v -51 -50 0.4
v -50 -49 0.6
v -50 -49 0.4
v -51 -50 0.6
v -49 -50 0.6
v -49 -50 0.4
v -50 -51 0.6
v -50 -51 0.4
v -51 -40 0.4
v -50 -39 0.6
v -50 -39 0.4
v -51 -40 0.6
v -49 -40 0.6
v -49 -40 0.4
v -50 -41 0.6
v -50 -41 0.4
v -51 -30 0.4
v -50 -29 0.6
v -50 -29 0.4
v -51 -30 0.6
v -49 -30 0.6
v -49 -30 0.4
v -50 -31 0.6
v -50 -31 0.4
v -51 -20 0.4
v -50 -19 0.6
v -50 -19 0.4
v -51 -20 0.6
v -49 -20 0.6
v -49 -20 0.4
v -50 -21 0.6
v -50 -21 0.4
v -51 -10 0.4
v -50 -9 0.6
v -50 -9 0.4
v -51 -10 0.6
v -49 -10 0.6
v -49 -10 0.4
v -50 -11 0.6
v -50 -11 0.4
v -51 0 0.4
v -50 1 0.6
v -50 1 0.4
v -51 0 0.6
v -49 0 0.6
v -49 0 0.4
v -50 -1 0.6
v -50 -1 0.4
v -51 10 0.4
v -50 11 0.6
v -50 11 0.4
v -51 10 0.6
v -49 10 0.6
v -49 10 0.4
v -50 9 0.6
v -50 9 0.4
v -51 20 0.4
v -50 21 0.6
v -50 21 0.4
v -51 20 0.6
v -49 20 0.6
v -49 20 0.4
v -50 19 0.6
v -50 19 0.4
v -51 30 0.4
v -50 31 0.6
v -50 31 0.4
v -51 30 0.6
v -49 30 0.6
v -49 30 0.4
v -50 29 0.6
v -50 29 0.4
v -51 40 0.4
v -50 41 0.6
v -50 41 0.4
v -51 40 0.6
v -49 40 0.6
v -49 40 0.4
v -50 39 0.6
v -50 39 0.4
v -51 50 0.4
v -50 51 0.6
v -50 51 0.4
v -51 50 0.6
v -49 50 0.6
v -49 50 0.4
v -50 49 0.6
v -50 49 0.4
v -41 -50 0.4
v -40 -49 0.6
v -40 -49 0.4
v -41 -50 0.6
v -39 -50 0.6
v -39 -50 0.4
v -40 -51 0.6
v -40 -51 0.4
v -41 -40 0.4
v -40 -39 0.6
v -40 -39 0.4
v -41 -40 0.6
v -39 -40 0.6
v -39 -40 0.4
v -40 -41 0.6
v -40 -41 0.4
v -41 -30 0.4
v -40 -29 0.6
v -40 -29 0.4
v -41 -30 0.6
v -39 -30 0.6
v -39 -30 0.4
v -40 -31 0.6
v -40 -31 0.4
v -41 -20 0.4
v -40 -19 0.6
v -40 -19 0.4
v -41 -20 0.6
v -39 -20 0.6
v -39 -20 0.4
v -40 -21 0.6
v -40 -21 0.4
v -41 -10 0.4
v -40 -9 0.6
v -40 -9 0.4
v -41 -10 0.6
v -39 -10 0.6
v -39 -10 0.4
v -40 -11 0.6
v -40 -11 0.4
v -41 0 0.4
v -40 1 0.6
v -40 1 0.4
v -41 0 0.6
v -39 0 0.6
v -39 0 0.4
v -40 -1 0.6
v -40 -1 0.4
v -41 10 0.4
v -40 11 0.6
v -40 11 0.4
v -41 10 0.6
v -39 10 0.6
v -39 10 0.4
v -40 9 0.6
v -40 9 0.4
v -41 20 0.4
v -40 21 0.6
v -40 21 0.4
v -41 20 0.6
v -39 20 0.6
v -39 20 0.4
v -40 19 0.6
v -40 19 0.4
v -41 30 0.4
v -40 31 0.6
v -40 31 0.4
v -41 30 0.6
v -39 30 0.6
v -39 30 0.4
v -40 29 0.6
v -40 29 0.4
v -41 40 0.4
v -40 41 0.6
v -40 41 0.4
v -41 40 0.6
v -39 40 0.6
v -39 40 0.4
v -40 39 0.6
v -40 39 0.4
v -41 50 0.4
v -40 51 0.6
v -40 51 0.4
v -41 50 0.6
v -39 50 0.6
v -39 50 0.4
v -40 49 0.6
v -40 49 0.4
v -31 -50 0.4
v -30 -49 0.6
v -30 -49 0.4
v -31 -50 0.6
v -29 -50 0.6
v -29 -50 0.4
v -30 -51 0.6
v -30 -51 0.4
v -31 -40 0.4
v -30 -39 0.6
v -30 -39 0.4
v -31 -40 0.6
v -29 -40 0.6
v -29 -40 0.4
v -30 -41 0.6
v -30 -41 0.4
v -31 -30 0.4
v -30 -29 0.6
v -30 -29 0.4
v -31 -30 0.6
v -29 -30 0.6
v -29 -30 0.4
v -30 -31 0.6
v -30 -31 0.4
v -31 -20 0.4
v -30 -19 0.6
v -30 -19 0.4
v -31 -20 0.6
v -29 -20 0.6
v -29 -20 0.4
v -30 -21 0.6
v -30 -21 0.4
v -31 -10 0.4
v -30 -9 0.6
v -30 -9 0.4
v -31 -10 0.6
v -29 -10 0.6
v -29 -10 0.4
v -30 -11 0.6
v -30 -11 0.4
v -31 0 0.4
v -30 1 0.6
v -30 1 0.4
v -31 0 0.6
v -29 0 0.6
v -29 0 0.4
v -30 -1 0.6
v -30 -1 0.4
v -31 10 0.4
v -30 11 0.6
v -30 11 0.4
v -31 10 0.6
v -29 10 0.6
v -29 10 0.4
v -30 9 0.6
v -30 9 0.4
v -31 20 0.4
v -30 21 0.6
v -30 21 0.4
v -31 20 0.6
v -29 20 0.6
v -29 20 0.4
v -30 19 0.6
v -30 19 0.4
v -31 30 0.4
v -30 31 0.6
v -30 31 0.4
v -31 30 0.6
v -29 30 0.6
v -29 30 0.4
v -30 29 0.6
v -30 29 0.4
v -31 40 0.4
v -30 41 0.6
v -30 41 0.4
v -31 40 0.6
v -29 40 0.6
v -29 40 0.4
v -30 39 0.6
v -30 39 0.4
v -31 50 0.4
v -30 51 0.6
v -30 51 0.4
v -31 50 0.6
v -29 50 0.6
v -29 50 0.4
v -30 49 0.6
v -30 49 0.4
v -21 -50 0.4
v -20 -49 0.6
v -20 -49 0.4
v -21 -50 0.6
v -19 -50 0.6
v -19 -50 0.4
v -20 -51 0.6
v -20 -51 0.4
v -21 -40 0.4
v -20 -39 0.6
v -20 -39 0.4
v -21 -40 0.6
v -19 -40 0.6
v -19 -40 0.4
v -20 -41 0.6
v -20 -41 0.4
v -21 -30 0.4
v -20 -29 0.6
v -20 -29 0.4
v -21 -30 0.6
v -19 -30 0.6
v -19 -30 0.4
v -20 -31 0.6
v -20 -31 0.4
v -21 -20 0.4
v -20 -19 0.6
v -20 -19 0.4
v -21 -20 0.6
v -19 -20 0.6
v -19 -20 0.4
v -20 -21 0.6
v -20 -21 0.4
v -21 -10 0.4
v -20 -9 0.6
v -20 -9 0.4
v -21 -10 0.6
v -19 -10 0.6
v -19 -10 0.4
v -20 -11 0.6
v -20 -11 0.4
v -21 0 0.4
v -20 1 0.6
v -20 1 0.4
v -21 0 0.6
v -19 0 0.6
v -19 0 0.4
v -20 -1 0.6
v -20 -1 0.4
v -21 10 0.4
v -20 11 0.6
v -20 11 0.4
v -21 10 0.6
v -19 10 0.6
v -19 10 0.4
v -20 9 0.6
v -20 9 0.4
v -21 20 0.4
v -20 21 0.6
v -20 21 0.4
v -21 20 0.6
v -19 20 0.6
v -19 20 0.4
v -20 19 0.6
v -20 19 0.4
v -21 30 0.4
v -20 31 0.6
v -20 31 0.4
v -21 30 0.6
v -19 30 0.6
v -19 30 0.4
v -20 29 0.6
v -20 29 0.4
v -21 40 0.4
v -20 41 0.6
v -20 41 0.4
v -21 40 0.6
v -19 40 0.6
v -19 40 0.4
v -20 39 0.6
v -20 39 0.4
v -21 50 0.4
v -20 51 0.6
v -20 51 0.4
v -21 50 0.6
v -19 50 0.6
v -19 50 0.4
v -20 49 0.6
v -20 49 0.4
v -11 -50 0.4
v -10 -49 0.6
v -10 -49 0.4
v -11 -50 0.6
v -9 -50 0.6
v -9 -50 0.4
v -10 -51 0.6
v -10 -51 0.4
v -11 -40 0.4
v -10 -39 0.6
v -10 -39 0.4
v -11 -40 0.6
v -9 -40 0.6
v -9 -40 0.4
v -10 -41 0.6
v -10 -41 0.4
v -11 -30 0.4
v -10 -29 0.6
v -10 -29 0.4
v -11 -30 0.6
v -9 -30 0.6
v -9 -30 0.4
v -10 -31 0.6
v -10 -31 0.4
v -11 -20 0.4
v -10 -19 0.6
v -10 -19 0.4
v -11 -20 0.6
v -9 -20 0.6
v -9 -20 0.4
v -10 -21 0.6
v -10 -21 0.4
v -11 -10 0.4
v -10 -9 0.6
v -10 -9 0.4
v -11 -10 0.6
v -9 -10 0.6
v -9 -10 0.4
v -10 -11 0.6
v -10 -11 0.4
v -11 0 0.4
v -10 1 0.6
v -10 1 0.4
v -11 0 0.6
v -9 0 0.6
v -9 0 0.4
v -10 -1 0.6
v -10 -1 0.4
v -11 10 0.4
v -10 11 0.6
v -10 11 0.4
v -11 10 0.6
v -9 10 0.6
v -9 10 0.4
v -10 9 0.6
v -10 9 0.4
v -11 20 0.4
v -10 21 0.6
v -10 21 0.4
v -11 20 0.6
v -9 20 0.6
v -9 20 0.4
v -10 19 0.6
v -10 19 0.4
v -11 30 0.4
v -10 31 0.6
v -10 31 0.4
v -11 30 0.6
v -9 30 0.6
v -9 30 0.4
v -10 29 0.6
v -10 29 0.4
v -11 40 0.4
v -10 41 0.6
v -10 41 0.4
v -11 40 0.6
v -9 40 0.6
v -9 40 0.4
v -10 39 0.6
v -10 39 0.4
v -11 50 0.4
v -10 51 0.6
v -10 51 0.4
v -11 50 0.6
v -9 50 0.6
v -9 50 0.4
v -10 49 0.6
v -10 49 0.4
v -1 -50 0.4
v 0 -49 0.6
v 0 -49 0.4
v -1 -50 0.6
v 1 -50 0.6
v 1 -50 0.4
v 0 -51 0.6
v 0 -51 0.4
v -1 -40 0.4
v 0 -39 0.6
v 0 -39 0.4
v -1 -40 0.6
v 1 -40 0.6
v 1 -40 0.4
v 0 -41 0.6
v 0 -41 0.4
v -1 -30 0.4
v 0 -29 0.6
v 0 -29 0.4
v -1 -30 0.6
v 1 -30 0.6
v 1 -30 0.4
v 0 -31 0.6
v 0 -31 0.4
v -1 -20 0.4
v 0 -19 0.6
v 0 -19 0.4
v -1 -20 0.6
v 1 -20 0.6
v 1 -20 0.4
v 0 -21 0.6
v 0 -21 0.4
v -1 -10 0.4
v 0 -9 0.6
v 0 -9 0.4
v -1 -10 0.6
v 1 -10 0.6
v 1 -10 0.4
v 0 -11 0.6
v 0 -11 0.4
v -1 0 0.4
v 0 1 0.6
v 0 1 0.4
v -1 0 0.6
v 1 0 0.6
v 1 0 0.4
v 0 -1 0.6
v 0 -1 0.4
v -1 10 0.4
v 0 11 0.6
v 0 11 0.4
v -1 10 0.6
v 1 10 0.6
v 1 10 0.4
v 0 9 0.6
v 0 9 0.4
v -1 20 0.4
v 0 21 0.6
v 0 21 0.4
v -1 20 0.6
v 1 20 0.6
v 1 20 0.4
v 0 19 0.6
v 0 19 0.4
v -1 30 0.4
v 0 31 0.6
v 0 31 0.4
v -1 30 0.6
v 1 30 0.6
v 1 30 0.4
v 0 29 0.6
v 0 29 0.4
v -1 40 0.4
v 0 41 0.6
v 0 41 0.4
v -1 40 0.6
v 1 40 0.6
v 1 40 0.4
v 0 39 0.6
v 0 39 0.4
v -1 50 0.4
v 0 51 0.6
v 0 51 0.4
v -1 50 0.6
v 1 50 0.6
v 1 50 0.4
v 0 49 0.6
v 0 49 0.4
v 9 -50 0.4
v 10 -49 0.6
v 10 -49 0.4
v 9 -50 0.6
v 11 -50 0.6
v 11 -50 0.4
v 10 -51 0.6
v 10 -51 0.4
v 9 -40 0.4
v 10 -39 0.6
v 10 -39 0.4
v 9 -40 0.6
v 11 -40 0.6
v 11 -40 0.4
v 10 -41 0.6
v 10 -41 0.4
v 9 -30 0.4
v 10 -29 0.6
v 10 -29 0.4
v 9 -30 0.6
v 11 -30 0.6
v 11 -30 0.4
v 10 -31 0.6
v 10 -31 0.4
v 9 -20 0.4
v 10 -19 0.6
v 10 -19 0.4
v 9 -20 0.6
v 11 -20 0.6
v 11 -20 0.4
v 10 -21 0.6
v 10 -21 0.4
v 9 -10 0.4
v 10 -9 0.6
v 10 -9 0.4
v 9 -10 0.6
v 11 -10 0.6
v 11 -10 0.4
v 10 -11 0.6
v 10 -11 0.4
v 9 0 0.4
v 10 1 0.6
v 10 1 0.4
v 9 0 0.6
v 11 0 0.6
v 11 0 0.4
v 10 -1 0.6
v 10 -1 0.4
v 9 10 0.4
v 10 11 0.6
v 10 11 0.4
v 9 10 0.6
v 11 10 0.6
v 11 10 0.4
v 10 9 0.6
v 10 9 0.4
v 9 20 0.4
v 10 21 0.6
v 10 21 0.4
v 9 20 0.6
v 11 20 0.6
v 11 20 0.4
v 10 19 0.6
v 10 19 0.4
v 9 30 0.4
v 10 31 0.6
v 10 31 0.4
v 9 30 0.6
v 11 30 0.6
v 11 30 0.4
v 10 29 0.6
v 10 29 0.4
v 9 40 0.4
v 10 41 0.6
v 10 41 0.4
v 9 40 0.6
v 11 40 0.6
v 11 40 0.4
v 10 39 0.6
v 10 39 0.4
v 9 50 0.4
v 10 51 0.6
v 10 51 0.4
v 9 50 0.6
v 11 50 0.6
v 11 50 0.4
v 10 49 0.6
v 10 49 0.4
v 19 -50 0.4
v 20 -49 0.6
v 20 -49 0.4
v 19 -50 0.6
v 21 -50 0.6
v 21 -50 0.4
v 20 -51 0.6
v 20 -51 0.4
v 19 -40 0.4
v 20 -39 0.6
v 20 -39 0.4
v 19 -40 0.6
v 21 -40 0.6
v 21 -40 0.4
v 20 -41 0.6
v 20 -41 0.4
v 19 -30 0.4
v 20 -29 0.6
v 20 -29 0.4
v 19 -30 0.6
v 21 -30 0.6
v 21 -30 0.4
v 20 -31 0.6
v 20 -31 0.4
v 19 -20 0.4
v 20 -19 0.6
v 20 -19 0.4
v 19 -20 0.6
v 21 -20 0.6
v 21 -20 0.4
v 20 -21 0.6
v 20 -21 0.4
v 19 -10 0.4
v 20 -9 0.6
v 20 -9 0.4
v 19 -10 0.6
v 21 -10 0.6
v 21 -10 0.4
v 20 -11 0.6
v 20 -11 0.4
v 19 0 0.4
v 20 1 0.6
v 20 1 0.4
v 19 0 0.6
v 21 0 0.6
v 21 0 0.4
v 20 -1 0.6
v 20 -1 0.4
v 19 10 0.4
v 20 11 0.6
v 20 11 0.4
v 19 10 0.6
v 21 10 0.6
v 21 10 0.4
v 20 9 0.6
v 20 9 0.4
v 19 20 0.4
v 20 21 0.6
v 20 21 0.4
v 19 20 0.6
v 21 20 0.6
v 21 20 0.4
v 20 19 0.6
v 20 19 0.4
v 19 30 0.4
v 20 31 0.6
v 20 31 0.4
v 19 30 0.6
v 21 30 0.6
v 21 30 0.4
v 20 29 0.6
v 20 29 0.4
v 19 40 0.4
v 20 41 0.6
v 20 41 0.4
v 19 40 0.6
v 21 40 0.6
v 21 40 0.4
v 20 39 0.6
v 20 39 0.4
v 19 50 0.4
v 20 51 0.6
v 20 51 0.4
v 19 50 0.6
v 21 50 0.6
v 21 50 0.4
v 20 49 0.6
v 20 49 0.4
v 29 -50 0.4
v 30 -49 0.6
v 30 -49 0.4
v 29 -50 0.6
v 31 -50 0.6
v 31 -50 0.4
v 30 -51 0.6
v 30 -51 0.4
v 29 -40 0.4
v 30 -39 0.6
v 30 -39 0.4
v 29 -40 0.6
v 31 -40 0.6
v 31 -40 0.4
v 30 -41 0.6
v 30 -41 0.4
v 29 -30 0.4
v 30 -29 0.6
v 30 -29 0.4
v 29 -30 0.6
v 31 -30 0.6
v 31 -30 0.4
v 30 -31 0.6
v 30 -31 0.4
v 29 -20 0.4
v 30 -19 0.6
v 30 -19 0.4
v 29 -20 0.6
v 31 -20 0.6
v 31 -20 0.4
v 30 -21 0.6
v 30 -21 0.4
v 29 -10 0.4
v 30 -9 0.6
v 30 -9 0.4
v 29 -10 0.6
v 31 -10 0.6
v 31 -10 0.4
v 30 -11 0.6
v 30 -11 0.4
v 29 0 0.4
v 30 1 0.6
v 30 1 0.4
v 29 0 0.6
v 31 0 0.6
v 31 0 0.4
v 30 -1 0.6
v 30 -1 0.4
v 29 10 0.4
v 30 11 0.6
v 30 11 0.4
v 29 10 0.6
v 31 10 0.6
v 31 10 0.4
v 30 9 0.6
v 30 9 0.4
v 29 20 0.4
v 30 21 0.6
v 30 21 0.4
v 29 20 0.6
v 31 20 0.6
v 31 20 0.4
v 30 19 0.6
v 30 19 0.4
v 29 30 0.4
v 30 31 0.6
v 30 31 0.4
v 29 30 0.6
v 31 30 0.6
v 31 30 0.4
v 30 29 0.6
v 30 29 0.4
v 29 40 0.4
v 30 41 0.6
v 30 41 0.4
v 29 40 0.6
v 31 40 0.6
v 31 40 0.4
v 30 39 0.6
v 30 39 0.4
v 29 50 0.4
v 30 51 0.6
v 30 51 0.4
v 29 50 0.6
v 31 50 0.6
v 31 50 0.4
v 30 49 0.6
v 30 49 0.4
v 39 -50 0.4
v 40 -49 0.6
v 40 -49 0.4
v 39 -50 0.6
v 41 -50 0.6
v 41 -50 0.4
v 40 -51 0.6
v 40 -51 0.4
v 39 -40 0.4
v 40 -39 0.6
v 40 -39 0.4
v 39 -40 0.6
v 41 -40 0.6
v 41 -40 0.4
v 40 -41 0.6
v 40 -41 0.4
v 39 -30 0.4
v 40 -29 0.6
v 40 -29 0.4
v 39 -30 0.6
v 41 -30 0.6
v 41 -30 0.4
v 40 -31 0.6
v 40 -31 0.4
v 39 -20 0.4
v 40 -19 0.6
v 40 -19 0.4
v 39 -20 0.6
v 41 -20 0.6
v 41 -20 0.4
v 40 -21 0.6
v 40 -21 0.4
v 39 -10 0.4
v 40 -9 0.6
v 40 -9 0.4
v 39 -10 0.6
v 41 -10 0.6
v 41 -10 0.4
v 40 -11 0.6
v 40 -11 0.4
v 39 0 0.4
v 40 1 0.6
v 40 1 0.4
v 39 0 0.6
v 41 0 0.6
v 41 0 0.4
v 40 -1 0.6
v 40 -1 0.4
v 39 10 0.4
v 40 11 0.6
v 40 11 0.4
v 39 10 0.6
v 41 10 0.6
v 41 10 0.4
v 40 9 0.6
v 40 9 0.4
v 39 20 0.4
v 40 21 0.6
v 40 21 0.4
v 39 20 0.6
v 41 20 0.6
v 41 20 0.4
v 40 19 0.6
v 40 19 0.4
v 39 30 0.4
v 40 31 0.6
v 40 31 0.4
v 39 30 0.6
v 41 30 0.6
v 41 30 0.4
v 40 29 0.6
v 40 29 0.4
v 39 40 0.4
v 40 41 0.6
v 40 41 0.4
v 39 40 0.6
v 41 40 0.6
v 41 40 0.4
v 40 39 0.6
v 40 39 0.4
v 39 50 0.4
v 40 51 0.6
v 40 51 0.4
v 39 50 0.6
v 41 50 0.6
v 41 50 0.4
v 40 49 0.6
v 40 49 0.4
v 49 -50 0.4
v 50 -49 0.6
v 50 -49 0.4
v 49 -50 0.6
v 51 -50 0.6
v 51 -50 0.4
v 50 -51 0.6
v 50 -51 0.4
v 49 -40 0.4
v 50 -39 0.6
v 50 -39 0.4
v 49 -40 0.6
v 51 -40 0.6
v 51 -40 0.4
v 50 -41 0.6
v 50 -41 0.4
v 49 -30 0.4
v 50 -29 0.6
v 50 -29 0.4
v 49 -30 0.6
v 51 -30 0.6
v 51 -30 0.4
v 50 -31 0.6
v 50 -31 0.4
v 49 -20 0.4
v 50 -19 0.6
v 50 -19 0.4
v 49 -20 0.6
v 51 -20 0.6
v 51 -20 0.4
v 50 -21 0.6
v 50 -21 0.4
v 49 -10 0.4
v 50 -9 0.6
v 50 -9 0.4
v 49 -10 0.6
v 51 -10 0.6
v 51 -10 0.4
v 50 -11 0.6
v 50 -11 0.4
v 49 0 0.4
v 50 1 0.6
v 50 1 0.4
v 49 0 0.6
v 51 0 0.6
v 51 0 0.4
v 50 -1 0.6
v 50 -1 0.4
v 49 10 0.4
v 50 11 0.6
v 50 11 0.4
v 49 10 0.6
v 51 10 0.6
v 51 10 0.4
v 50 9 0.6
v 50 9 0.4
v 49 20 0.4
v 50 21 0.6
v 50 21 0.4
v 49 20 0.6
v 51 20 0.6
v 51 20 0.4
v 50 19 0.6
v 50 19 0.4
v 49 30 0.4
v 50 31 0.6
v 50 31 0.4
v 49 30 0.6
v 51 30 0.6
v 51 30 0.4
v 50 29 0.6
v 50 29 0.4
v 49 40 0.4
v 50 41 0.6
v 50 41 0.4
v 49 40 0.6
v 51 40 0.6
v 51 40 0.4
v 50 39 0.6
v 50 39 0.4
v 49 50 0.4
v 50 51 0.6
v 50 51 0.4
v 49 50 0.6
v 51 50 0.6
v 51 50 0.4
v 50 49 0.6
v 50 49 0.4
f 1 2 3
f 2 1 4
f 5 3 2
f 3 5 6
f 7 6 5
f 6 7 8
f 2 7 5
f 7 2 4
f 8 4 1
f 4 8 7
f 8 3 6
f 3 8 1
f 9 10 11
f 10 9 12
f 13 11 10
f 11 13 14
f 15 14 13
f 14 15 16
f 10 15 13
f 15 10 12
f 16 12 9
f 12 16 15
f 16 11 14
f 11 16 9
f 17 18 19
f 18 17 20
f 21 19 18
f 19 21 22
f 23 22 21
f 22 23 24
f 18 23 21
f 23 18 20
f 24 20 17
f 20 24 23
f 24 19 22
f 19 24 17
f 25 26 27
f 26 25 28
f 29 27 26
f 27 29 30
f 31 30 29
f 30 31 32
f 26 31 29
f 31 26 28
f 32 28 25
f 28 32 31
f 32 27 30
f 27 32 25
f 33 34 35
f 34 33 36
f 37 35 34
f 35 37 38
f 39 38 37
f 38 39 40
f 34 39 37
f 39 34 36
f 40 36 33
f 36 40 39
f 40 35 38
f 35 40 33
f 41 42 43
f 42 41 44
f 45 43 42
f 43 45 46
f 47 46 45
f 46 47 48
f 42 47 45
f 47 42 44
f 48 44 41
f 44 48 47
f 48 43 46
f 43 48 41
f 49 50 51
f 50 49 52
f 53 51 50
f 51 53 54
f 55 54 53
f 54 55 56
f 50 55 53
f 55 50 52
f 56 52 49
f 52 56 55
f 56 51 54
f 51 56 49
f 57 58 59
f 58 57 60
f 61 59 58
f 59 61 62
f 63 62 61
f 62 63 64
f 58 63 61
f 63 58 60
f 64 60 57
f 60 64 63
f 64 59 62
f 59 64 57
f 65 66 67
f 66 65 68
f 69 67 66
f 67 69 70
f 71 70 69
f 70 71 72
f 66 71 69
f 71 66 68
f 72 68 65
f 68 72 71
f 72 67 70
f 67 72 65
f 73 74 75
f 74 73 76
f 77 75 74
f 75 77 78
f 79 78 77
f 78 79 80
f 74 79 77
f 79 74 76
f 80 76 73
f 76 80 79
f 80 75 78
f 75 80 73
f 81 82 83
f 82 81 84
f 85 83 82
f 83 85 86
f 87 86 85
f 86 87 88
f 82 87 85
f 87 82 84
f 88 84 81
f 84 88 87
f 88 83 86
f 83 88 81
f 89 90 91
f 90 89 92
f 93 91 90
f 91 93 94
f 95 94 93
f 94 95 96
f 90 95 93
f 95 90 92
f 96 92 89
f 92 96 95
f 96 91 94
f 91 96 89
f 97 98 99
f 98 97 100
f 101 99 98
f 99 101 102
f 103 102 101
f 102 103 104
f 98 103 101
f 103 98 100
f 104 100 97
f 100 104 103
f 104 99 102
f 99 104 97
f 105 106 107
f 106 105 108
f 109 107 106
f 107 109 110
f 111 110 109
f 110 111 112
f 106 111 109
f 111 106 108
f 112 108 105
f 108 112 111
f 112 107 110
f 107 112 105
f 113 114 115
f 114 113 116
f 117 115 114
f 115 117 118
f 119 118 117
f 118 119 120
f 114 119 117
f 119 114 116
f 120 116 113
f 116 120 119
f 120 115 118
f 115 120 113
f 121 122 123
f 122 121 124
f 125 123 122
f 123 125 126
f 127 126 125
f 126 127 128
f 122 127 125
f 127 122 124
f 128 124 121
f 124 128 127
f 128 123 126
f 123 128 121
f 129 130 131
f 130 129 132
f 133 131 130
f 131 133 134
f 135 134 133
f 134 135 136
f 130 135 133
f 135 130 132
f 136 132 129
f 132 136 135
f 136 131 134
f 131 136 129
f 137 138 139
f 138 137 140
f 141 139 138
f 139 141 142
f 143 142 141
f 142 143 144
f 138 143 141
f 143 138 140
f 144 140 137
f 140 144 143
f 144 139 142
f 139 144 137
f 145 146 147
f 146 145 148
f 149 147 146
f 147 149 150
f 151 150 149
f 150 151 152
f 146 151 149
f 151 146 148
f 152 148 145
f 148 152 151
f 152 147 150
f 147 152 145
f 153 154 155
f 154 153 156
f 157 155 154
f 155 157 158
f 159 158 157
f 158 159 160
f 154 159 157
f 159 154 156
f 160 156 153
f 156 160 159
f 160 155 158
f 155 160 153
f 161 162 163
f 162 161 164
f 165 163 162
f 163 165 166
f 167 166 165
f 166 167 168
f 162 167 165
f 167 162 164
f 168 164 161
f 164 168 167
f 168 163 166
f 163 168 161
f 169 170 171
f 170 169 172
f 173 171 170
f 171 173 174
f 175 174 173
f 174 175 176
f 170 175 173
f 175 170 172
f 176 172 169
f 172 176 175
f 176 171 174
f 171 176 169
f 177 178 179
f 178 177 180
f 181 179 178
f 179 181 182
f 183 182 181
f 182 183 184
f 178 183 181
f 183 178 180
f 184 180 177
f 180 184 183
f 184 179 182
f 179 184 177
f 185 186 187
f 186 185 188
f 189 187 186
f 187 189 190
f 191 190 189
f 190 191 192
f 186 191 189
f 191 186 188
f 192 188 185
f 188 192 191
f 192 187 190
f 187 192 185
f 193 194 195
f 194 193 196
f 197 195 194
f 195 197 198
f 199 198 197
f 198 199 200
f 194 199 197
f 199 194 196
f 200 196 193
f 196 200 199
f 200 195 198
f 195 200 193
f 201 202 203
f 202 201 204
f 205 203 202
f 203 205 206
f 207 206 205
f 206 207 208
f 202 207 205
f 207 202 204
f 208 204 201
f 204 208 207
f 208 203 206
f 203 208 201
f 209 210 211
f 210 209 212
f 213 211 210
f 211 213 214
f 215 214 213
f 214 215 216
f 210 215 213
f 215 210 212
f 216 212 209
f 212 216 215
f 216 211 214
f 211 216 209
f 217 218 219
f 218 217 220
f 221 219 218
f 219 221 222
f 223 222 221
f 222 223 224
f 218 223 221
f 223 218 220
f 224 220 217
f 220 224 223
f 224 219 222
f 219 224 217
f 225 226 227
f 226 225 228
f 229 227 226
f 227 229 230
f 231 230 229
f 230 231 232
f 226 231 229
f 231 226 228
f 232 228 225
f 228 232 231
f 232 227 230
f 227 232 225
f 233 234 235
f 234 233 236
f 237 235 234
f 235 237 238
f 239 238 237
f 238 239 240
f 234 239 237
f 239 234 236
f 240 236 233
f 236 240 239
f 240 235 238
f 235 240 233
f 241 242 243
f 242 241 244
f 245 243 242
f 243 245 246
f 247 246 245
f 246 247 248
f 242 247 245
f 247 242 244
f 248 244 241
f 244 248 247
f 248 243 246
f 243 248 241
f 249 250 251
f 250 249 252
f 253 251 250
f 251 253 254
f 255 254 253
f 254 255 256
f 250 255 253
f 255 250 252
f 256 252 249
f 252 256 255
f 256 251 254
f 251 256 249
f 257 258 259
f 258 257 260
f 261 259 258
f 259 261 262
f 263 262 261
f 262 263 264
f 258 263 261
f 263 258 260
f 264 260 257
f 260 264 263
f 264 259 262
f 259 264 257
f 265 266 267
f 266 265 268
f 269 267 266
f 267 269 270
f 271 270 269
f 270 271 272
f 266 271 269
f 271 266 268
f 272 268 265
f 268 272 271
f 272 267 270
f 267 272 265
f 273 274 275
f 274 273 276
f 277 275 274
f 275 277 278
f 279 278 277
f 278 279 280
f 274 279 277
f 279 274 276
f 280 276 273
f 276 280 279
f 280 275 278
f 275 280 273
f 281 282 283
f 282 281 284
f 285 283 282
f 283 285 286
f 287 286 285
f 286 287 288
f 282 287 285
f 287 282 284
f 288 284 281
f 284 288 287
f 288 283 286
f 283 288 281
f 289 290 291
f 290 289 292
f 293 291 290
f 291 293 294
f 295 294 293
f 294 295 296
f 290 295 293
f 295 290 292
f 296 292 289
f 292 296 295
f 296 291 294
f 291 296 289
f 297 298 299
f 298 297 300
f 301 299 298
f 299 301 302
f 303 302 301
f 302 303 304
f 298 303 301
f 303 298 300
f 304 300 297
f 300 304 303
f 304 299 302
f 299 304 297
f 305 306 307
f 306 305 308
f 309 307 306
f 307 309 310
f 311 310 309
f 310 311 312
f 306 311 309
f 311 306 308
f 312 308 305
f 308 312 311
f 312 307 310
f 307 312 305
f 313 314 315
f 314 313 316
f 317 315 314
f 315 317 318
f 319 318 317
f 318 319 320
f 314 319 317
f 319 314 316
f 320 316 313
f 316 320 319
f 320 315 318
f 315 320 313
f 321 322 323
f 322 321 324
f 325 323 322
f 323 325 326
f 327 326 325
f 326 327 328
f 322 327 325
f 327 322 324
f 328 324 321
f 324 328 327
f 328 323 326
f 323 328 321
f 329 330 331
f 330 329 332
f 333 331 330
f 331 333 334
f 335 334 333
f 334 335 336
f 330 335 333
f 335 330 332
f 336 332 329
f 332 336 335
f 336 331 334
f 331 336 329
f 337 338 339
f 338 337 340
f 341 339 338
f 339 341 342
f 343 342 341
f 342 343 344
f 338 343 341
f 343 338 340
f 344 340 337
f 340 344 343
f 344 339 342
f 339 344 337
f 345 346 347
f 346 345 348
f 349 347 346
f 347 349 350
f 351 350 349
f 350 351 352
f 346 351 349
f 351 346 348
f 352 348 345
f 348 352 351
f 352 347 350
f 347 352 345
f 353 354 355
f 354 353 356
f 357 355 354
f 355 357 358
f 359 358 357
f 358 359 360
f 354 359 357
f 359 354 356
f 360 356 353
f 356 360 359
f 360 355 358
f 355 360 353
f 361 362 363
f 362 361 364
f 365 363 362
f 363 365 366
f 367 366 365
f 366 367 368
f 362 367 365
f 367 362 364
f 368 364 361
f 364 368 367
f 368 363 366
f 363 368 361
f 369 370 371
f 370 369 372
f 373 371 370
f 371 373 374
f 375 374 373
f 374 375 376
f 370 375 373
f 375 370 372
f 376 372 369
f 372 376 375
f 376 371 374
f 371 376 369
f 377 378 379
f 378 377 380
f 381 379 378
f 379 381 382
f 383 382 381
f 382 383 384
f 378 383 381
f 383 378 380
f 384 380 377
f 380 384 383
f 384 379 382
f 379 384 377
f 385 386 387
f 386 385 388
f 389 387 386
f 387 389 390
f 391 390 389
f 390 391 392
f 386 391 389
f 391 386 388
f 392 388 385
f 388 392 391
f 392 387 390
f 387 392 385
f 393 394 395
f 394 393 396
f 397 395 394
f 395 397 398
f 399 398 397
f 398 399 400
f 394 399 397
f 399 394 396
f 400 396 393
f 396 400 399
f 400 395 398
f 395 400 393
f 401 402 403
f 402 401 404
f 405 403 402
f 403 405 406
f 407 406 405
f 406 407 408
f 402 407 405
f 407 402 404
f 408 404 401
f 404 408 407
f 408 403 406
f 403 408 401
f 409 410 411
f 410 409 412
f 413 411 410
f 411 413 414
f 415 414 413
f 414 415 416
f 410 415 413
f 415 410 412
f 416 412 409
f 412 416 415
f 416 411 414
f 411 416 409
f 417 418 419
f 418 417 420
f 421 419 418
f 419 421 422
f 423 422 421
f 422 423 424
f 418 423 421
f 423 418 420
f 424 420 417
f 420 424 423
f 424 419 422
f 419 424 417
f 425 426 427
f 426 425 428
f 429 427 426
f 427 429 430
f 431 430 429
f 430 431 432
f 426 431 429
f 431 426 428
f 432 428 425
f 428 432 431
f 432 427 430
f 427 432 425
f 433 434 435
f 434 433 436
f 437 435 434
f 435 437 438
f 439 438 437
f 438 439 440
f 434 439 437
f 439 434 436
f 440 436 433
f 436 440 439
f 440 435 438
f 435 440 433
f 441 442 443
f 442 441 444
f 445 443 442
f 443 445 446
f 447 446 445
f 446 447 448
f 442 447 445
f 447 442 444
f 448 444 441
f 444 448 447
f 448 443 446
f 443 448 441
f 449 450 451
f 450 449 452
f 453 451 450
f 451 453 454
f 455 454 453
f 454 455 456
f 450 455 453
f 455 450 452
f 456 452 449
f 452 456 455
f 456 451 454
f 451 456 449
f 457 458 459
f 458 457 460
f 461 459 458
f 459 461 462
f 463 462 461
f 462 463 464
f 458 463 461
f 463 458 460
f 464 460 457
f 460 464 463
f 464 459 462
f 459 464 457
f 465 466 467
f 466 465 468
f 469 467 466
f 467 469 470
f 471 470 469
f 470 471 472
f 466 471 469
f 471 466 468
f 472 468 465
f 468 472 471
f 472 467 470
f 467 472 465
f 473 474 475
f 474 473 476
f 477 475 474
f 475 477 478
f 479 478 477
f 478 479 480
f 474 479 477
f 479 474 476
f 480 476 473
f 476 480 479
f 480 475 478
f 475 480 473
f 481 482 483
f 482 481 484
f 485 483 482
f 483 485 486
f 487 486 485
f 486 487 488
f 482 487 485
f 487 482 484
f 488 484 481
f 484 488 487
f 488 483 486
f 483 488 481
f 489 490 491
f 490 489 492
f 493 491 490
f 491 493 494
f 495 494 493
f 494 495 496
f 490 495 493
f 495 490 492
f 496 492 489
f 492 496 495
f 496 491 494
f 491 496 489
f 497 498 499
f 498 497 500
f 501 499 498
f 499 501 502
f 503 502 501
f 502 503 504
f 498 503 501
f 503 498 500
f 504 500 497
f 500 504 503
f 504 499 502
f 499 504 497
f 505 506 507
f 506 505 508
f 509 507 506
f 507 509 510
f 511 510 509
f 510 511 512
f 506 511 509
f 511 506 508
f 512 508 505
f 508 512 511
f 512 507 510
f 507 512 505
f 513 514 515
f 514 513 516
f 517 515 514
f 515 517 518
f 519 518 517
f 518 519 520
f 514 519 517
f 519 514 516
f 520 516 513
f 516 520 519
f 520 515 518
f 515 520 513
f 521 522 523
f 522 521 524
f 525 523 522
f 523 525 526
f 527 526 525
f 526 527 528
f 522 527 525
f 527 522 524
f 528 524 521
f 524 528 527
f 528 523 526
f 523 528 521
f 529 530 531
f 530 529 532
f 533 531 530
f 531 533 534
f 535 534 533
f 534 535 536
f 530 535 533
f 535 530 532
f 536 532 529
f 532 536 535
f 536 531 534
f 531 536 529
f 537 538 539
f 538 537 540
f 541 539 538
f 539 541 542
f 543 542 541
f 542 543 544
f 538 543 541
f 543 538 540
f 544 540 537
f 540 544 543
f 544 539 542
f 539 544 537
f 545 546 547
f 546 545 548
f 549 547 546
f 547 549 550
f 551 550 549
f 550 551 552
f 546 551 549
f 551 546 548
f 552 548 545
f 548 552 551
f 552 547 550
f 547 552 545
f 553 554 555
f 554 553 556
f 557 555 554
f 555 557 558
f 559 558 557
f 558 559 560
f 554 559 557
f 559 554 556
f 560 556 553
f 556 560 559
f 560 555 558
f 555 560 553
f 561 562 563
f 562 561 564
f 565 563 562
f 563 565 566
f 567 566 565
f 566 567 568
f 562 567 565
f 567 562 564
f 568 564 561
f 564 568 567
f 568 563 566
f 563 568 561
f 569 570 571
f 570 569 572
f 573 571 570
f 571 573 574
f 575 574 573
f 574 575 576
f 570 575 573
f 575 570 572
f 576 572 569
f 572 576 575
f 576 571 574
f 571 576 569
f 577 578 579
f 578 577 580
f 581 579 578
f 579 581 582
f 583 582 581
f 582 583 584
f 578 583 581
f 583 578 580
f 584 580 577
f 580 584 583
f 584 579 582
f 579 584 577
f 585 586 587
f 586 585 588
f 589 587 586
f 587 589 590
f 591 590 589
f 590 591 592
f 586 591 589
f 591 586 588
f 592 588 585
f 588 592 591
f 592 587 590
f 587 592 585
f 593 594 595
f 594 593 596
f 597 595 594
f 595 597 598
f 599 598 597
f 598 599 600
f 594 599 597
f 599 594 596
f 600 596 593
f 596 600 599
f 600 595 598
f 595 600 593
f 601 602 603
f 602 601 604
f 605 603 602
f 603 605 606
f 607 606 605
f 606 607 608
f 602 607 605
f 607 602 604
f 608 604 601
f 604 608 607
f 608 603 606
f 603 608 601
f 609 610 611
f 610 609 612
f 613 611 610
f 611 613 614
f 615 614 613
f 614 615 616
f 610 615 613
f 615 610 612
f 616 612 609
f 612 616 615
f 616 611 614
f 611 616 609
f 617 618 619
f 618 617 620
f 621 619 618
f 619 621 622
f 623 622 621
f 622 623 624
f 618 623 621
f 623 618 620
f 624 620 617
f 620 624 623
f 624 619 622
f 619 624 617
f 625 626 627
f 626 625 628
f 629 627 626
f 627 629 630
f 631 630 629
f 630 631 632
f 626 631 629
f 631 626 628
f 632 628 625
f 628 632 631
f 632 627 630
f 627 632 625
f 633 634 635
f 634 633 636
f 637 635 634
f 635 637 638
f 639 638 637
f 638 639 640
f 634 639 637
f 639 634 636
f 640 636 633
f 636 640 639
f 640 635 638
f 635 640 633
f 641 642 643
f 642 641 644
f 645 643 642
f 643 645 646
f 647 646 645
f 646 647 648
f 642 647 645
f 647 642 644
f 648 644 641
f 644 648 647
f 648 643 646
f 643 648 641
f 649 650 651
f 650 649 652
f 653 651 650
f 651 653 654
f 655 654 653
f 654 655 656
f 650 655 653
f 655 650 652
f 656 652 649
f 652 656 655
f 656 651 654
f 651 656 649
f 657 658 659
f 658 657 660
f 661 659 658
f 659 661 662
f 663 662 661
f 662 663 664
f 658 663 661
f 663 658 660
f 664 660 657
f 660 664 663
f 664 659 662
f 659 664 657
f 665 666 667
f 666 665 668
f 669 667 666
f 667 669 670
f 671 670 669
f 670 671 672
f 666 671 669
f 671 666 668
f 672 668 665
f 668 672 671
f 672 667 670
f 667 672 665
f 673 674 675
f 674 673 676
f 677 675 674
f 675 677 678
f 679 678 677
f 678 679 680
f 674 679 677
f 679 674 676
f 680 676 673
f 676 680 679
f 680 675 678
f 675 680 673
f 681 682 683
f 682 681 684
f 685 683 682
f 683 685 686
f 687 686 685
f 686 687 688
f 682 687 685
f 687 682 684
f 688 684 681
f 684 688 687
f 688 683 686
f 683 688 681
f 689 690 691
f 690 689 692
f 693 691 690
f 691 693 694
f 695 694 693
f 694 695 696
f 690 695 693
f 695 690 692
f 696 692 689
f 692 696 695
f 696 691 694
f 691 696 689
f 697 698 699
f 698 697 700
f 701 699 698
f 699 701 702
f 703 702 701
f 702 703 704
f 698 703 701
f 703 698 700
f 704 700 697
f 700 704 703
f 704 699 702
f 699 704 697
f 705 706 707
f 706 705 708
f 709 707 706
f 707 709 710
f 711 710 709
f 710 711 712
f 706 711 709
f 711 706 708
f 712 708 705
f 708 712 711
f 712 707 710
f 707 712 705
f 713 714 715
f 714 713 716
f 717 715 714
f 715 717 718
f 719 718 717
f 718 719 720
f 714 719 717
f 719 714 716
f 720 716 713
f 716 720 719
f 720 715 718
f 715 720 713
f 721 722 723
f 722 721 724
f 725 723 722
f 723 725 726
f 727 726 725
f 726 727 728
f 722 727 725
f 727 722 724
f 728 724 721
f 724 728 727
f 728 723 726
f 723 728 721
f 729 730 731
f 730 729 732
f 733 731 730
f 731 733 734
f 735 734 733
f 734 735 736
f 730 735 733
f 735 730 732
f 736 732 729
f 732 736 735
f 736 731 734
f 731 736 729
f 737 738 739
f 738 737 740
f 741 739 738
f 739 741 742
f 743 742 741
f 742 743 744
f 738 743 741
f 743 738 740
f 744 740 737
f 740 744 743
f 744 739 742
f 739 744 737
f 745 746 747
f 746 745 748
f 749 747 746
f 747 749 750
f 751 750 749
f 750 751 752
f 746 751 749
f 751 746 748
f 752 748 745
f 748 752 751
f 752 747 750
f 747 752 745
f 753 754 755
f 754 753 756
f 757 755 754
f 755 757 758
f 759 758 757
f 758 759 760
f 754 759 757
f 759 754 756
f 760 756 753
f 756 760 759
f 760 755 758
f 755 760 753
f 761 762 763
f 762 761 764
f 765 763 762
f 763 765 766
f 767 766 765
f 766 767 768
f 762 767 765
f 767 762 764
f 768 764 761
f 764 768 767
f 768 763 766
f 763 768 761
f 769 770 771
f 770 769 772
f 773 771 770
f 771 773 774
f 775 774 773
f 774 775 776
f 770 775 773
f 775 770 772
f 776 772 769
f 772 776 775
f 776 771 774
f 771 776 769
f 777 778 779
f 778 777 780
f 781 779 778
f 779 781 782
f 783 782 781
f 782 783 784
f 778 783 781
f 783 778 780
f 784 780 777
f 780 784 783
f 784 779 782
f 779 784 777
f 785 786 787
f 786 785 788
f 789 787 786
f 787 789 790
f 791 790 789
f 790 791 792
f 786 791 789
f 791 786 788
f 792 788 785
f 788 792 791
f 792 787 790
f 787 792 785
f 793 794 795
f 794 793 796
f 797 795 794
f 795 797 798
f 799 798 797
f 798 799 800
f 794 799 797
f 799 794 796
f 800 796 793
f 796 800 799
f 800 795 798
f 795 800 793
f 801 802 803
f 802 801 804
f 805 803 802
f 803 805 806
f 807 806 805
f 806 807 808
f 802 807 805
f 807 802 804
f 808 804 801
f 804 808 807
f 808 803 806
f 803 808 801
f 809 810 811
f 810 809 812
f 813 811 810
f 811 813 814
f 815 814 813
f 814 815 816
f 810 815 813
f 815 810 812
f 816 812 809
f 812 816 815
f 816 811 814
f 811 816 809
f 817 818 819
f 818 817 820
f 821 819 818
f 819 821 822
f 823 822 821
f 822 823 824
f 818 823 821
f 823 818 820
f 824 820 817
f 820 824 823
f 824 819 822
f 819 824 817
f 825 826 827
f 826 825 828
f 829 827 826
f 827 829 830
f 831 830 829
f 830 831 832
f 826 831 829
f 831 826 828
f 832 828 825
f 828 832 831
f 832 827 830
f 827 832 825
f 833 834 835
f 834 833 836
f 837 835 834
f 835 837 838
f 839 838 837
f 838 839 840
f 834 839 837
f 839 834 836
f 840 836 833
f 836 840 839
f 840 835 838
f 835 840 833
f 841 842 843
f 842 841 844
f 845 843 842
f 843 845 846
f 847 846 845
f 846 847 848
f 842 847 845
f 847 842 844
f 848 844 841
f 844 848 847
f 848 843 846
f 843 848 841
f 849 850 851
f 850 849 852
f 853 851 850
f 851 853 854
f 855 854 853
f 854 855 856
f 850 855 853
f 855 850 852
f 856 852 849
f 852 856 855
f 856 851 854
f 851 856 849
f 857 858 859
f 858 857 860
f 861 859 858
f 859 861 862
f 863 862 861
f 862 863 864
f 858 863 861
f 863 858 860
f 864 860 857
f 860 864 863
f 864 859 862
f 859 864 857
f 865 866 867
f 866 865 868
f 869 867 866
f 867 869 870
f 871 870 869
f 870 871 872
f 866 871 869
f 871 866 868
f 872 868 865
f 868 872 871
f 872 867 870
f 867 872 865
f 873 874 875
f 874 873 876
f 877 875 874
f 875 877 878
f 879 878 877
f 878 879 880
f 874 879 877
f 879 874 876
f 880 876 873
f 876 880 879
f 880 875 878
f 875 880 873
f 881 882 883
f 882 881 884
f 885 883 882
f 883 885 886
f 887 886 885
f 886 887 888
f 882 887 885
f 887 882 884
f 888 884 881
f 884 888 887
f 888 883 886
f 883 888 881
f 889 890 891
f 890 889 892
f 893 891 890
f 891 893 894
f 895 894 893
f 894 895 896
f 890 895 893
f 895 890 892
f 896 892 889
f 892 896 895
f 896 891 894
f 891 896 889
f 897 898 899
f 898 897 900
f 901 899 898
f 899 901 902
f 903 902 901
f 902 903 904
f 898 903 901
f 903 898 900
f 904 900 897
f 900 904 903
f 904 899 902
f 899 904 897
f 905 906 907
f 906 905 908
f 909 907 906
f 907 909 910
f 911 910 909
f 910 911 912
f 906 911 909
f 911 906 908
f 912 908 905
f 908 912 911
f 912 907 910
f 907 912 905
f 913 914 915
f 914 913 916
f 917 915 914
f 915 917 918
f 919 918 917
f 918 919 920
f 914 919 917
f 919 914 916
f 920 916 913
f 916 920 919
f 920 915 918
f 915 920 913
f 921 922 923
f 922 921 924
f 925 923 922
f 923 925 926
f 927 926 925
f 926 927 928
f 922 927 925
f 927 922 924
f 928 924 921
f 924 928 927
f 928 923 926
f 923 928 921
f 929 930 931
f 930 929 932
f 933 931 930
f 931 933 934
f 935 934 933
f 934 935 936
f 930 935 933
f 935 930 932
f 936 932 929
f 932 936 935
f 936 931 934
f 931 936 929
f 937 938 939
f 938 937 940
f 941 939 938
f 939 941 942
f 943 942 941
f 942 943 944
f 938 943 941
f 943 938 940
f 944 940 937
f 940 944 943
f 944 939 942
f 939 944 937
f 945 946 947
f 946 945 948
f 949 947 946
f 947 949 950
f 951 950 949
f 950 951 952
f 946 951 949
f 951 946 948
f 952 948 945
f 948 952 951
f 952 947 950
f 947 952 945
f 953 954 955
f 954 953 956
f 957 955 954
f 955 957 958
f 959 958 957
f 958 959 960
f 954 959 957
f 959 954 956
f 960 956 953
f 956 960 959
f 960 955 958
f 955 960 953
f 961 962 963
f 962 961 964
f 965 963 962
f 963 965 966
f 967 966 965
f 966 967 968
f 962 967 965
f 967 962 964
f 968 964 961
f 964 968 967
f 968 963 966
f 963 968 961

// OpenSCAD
//  This is a quick customizable way to make an array of columns of any size and any size columns


//Defines the area of the  array in mm
a=100;

//Defines the radius of the columns in mm
r=1;

//Defines the thickness of the columns in mm
t=0.2;

//Defines the spacing of the columns in mm
s=10; 



//Choose your desired shape from the drop down menu
$fn = 4;//[3:Triangle, 4:Square, 6:Hexagon, 100:Circle]

 



module array() {

  q = floor(a/2/s);
    for (x=[-q:q])
      for (y=[-q:q])
        translate([x*s,y*s,r/2])
          cylinder(h=t, r=r, ,center=true);
}


array();
